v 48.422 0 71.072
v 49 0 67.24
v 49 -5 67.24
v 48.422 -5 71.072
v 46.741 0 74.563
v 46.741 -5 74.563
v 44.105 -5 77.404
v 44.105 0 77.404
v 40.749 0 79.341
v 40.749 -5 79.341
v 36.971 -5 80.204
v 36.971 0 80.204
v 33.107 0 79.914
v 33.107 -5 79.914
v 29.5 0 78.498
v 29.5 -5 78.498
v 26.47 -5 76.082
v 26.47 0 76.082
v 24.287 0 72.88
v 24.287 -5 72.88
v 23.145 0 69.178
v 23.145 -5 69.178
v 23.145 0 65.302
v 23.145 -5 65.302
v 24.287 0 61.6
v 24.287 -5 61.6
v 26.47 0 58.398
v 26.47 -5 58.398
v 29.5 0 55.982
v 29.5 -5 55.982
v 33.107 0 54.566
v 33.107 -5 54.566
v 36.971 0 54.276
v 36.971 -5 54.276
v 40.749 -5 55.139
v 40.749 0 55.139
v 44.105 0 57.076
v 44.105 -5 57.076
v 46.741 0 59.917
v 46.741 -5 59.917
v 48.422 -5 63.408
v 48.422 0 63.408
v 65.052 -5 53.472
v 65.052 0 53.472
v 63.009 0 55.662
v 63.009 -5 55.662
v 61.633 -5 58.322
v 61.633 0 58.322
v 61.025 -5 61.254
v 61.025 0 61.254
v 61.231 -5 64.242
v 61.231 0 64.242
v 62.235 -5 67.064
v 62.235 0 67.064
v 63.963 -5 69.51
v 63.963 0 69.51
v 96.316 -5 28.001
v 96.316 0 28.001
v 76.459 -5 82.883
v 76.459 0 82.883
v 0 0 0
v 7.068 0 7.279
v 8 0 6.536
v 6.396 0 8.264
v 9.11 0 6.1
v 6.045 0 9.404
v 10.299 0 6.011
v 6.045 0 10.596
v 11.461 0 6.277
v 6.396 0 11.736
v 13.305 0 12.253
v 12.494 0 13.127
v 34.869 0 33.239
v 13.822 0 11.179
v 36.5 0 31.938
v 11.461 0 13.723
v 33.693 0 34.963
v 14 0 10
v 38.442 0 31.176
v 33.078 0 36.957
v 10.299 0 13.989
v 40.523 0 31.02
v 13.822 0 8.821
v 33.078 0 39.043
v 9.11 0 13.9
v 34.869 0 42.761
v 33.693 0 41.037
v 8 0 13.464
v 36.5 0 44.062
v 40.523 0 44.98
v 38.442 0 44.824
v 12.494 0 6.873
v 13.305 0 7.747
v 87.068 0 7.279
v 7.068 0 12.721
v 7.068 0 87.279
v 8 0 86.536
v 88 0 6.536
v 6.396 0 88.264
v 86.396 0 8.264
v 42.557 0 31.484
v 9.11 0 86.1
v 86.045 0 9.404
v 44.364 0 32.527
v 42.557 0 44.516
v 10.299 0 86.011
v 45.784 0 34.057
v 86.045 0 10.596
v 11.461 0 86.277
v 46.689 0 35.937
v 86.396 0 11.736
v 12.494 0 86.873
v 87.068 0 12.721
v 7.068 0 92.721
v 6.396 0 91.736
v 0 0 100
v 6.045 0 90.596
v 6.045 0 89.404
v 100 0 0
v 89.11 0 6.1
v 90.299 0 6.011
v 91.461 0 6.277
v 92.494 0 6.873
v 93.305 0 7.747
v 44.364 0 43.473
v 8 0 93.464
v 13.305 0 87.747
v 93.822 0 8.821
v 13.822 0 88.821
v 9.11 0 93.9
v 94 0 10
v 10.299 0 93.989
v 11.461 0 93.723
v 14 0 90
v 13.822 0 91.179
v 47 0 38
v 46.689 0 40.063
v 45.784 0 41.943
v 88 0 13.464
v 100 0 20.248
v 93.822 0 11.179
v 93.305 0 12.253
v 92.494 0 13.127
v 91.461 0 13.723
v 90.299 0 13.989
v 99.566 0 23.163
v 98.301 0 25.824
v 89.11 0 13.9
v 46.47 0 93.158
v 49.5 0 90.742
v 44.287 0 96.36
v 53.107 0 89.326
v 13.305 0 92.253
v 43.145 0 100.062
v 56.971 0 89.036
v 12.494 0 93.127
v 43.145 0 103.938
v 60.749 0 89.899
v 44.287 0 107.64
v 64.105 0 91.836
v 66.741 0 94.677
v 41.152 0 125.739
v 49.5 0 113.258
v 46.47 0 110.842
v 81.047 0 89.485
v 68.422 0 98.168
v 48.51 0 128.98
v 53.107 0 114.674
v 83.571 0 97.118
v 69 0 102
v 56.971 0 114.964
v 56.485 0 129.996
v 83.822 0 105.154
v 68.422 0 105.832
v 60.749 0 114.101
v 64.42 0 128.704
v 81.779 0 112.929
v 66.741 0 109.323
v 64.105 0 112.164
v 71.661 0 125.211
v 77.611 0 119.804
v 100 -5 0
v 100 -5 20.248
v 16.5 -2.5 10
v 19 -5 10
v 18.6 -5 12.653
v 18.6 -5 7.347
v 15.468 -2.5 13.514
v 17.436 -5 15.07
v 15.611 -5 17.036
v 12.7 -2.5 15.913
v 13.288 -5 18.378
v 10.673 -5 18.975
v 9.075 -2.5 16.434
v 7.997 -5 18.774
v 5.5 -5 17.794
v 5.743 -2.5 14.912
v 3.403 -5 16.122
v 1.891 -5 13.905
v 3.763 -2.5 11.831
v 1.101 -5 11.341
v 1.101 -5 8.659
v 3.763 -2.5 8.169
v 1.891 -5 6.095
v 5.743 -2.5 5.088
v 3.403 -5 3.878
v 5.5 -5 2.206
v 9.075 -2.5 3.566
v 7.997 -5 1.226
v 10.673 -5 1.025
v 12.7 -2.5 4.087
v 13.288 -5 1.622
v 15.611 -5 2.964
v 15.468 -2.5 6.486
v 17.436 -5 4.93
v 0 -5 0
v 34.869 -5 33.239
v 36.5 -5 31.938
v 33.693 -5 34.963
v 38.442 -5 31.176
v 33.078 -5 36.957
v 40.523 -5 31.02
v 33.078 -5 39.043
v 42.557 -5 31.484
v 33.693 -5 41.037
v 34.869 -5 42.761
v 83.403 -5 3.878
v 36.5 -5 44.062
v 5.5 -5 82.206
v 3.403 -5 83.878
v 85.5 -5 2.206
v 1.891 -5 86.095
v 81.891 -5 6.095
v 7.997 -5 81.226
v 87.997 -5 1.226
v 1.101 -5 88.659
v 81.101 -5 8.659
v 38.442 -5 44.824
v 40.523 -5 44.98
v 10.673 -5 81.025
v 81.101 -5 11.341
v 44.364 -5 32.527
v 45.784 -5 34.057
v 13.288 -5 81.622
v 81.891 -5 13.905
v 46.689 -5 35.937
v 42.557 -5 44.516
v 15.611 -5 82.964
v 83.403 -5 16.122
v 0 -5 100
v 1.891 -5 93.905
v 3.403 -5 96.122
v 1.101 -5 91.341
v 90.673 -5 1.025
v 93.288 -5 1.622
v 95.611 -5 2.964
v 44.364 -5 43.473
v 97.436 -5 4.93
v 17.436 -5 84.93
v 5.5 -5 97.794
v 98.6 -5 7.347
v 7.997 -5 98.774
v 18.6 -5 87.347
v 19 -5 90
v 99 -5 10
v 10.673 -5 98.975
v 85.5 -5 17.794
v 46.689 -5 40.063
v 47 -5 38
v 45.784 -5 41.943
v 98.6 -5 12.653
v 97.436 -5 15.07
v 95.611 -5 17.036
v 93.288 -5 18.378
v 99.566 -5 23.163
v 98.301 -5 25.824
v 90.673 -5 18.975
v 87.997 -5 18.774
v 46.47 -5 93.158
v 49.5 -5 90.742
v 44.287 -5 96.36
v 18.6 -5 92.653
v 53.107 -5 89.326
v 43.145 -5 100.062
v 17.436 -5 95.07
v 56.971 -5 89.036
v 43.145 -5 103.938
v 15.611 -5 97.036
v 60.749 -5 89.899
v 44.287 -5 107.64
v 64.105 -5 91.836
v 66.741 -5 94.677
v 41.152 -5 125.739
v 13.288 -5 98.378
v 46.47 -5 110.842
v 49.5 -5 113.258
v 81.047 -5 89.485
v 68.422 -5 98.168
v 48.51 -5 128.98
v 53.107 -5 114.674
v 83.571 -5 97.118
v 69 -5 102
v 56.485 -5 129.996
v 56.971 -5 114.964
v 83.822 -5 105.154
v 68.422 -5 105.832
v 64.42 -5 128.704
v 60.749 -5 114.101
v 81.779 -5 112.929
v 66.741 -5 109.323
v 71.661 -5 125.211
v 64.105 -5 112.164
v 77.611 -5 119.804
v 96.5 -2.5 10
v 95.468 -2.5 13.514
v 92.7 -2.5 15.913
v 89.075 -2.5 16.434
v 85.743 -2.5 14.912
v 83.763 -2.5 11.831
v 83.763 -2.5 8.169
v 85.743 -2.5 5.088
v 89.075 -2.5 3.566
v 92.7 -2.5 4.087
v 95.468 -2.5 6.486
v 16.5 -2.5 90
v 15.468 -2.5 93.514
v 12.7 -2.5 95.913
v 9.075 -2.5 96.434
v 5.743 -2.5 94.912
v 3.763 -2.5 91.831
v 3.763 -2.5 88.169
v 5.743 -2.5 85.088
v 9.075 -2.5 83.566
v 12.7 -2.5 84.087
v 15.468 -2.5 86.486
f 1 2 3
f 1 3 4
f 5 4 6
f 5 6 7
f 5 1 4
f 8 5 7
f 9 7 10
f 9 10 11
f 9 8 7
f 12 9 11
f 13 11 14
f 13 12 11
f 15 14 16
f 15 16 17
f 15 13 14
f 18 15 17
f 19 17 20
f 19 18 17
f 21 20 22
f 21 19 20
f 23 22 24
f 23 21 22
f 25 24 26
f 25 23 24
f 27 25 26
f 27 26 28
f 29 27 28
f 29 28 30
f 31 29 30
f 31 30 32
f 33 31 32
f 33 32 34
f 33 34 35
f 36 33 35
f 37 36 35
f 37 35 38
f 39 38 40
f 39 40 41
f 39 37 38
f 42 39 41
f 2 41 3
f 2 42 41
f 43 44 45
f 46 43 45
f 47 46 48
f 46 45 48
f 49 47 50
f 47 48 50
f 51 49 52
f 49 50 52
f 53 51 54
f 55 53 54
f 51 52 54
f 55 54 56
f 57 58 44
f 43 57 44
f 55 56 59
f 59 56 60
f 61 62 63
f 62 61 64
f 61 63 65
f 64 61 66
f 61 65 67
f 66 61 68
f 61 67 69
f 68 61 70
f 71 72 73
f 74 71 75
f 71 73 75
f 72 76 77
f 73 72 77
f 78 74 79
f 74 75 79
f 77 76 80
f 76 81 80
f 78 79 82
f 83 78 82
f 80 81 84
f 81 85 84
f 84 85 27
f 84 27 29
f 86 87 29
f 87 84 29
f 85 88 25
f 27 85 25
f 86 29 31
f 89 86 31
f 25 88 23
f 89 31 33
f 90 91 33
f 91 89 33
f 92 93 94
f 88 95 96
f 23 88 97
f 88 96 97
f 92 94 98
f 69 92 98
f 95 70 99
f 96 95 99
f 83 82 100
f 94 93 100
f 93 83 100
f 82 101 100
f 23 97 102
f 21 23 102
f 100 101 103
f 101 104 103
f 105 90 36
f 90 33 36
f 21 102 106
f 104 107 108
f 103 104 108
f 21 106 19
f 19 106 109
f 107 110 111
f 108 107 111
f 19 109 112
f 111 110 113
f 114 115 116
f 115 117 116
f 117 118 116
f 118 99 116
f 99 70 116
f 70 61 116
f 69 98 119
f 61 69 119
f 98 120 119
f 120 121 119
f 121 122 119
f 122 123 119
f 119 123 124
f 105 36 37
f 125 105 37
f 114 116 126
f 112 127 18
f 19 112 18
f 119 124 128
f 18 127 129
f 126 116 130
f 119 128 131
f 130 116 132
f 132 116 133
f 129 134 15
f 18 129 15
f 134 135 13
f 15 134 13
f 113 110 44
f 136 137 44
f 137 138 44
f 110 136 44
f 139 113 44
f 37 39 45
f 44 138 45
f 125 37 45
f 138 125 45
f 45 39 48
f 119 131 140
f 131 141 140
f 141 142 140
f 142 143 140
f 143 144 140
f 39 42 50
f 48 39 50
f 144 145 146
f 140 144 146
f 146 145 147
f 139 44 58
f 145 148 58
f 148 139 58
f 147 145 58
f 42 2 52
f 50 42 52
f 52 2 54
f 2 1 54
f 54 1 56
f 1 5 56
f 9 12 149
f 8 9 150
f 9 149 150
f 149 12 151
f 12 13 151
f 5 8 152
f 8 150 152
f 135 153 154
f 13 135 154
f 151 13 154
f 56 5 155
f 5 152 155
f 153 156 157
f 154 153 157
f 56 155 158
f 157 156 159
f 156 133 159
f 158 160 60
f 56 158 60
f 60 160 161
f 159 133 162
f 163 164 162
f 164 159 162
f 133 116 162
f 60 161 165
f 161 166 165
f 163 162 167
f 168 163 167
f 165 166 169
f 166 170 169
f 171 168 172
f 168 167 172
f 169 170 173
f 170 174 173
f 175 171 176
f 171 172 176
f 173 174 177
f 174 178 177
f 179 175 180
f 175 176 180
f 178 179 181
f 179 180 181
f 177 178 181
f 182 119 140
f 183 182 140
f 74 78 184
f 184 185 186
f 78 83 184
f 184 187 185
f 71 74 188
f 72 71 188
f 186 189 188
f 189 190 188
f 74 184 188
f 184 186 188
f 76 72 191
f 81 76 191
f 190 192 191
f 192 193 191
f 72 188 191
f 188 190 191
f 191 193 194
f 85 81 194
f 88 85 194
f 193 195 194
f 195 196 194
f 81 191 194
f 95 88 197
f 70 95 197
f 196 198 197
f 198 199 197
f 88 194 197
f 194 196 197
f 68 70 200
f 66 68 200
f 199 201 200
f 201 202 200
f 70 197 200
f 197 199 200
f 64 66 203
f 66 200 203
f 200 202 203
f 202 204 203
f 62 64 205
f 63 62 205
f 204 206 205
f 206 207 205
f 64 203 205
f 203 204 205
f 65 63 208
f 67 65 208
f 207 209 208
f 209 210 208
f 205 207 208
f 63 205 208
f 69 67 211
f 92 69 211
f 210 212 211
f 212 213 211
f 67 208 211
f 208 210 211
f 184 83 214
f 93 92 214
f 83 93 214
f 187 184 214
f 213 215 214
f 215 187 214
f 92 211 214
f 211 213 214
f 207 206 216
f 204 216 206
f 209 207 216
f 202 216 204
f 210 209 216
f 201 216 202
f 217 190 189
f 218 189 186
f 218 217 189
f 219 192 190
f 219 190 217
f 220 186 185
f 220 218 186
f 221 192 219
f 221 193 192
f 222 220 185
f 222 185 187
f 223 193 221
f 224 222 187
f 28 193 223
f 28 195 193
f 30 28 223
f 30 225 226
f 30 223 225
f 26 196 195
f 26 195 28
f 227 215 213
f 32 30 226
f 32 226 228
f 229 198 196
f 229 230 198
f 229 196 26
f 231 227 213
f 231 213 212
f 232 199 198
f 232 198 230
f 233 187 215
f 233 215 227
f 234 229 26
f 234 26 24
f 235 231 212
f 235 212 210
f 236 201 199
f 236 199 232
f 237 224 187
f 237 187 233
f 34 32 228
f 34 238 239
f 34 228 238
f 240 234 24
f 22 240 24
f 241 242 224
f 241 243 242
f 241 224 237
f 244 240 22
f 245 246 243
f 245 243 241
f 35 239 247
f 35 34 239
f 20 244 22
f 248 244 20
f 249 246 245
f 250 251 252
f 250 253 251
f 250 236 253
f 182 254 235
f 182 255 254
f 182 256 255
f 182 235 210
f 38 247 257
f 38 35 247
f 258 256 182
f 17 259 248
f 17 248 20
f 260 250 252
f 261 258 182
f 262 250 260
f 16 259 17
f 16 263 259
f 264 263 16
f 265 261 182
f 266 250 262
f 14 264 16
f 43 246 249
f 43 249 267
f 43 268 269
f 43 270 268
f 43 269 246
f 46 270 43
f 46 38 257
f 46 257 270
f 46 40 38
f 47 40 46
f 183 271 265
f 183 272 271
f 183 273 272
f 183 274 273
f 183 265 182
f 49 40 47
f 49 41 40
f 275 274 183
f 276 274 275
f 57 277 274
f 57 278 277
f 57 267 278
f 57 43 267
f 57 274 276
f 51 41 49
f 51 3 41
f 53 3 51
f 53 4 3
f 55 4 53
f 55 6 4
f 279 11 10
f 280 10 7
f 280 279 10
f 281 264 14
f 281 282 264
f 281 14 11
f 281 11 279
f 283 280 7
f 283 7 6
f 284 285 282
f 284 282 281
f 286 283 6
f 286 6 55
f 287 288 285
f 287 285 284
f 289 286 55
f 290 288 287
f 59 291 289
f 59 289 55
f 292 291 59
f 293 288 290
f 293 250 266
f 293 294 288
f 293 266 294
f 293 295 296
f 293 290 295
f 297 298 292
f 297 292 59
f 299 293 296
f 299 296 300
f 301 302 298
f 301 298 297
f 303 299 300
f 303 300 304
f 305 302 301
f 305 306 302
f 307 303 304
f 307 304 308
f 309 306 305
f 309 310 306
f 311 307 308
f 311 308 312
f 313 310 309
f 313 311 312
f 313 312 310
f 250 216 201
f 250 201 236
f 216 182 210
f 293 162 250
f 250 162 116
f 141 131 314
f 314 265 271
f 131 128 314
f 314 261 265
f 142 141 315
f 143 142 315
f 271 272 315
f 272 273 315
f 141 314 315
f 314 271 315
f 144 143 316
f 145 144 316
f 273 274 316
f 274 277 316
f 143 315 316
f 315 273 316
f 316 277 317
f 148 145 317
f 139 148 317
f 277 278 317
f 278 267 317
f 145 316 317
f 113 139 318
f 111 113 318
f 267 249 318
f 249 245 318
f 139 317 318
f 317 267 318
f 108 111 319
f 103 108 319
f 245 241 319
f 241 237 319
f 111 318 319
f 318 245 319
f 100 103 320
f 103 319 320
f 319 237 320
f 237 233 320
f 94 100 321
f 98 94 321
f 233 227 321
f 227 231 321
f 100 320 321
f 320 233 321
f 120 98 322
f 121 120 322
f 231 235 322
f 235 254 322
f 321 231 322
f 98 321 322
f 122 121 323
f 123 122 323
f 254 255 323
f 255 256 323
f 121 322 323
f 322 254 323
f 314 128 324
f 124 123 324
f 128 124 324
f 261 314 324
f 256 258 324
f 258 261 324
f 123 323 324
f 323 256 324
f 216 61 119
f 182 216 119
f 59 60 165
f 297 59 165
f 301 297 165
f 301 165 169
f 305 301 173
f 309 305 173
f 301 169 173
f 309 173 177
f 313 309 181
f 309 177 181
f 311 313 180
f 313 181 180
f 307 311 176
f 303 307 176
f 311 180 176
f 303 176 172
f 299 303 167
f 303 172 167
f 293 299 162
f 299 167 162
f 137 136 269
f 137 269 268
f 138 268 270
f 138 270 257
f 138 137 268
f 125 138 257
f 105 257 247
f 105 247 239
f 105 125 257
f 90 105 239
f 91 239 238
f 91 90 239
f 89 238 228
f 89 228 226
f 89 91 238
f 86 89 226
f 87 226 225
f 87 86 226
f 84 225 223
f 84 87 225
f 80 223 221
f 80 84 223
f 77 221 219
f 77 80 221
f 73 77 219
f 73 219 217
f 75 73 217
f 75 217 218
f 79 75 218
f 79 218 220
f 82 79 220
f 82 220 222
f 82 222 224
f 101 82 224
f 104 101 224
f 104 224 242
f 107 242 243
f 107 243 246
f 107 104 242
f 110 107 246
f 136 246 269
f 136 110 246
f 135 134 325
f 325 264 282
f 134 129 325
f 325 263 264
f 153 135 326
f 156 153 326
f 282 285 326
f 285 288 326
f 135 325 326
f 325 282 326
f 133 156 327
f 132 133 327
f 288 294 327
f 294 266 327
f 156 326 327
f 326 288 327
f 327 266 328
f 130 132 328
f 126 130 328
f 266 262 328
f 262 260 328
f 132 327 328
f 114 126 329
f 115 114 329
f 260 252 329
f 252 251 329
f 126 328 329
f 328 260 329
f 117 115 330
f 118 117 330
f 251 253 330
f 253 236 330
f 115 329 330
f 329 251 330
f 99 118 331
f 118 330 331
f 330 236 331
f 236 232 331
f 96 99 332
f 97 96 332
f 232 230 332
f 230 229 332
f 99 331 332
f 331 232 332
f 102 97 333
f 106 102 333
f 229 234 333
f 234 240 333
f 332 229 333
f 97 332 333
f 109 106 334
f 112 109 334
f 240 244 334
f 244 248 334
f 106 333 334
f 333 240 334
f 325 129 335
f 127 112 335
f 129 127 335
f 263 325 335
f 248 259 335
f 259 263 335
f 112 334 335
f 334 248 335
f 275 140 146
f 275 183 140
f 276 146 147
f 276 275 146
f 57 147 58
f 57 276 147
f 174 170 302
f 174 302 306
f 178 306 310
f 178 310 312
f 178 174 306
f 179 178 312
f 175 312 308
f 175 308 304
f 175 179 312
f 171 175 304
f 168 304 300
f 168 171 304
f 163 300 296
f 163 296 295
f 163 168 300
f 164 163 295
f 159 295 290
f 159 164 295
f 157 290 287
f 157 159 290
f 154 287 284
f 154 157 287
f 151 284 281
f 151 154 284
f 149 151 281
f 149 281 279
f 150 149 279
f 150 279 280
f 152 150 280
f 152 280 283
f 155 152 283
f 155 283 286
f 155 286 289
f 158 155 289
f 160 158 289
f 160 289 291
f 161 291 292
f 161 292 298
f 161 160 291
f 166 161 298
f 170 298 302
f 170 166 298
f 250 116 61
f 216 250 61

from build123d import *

# Parameters (mm, degrees)
F0_R     = 4
F0_R_2   = 7
F0_R_3   = 13
F1_DEPTH = 5
F2_SIZE  = 4.99999
F3_R     = 10


# Not quite as in the source:
# - a fillet or chamfer is up to 0.001 mm smaller than in the source, because OpenCascade refuses the exact size


with BuildPart() as f1:
    # F0 (on Front) → F1 (new body)
    with BuildSketch(Plane.XZ):
        with BuildLine():
            Line((0, 100), (0, 0))
            Line((0, 0), (100, 0))
            Line((100, 0), (100, 25))
            Line((100, 25), (65.0521931045, 53.4719299169))
            ThreePointArc((65.0521931045, 53.4719299169), (61.0252955601, 61.2544381602), (63.9626496251, 69.51005985))
            Line((63.9626496251, 69.51005985), (76.4587100452, 82.8834840181))
            ThreePointArc((76.4587100452, 82.8834840181), (77.6106511533, 119.803925318), (41.1521770426, 125.7390428077))
            Line((41.1521770426, 125.7390428077), (0, 100))
        make_face()
        with Locations((10, 10)):
            Circle(F0_R, mode=Mode.SUBTRACT)
        with Locations((40, 38)):
            Circle(F0_R_2, mode=Mode.SUBTRACT)
        with Locations((90, 10)):
            Circle(F0_R, mode=Mode.SUBTRACT)
        with Locations((10, 90)):
            Circle(F0_R, mode=Mode.SUBTRACT)
        with Locations((36, 67.24)):
            Circle(F0_R_3, mode=Mode.SUBTRACT)
        with Locations((56, 102)):
            Circle(F0_R_3, mode=Mode.SUBTRACT)
    extrude(amount=F1_DEPTH)

    # F2 (size 5 in the source; OpenCascade refuses exactly that, so slightly less here)
    f2_edges = [f1.edges().sort_by_distance(p)[0] for p in [
        (6, -5, 10),
        (86, -5, 10),
        (6, -5, 90),
    ]]
    chamfer(f2_edges, length=F2_SIZE)

    # F3
    f3_edges = [f1.edges().sort_by_distance(p)[0] for p in [
        (100, -2.5, 25),
    ]]
    fillet(f3_edges, radius=F3_R)


solid = f1.part
